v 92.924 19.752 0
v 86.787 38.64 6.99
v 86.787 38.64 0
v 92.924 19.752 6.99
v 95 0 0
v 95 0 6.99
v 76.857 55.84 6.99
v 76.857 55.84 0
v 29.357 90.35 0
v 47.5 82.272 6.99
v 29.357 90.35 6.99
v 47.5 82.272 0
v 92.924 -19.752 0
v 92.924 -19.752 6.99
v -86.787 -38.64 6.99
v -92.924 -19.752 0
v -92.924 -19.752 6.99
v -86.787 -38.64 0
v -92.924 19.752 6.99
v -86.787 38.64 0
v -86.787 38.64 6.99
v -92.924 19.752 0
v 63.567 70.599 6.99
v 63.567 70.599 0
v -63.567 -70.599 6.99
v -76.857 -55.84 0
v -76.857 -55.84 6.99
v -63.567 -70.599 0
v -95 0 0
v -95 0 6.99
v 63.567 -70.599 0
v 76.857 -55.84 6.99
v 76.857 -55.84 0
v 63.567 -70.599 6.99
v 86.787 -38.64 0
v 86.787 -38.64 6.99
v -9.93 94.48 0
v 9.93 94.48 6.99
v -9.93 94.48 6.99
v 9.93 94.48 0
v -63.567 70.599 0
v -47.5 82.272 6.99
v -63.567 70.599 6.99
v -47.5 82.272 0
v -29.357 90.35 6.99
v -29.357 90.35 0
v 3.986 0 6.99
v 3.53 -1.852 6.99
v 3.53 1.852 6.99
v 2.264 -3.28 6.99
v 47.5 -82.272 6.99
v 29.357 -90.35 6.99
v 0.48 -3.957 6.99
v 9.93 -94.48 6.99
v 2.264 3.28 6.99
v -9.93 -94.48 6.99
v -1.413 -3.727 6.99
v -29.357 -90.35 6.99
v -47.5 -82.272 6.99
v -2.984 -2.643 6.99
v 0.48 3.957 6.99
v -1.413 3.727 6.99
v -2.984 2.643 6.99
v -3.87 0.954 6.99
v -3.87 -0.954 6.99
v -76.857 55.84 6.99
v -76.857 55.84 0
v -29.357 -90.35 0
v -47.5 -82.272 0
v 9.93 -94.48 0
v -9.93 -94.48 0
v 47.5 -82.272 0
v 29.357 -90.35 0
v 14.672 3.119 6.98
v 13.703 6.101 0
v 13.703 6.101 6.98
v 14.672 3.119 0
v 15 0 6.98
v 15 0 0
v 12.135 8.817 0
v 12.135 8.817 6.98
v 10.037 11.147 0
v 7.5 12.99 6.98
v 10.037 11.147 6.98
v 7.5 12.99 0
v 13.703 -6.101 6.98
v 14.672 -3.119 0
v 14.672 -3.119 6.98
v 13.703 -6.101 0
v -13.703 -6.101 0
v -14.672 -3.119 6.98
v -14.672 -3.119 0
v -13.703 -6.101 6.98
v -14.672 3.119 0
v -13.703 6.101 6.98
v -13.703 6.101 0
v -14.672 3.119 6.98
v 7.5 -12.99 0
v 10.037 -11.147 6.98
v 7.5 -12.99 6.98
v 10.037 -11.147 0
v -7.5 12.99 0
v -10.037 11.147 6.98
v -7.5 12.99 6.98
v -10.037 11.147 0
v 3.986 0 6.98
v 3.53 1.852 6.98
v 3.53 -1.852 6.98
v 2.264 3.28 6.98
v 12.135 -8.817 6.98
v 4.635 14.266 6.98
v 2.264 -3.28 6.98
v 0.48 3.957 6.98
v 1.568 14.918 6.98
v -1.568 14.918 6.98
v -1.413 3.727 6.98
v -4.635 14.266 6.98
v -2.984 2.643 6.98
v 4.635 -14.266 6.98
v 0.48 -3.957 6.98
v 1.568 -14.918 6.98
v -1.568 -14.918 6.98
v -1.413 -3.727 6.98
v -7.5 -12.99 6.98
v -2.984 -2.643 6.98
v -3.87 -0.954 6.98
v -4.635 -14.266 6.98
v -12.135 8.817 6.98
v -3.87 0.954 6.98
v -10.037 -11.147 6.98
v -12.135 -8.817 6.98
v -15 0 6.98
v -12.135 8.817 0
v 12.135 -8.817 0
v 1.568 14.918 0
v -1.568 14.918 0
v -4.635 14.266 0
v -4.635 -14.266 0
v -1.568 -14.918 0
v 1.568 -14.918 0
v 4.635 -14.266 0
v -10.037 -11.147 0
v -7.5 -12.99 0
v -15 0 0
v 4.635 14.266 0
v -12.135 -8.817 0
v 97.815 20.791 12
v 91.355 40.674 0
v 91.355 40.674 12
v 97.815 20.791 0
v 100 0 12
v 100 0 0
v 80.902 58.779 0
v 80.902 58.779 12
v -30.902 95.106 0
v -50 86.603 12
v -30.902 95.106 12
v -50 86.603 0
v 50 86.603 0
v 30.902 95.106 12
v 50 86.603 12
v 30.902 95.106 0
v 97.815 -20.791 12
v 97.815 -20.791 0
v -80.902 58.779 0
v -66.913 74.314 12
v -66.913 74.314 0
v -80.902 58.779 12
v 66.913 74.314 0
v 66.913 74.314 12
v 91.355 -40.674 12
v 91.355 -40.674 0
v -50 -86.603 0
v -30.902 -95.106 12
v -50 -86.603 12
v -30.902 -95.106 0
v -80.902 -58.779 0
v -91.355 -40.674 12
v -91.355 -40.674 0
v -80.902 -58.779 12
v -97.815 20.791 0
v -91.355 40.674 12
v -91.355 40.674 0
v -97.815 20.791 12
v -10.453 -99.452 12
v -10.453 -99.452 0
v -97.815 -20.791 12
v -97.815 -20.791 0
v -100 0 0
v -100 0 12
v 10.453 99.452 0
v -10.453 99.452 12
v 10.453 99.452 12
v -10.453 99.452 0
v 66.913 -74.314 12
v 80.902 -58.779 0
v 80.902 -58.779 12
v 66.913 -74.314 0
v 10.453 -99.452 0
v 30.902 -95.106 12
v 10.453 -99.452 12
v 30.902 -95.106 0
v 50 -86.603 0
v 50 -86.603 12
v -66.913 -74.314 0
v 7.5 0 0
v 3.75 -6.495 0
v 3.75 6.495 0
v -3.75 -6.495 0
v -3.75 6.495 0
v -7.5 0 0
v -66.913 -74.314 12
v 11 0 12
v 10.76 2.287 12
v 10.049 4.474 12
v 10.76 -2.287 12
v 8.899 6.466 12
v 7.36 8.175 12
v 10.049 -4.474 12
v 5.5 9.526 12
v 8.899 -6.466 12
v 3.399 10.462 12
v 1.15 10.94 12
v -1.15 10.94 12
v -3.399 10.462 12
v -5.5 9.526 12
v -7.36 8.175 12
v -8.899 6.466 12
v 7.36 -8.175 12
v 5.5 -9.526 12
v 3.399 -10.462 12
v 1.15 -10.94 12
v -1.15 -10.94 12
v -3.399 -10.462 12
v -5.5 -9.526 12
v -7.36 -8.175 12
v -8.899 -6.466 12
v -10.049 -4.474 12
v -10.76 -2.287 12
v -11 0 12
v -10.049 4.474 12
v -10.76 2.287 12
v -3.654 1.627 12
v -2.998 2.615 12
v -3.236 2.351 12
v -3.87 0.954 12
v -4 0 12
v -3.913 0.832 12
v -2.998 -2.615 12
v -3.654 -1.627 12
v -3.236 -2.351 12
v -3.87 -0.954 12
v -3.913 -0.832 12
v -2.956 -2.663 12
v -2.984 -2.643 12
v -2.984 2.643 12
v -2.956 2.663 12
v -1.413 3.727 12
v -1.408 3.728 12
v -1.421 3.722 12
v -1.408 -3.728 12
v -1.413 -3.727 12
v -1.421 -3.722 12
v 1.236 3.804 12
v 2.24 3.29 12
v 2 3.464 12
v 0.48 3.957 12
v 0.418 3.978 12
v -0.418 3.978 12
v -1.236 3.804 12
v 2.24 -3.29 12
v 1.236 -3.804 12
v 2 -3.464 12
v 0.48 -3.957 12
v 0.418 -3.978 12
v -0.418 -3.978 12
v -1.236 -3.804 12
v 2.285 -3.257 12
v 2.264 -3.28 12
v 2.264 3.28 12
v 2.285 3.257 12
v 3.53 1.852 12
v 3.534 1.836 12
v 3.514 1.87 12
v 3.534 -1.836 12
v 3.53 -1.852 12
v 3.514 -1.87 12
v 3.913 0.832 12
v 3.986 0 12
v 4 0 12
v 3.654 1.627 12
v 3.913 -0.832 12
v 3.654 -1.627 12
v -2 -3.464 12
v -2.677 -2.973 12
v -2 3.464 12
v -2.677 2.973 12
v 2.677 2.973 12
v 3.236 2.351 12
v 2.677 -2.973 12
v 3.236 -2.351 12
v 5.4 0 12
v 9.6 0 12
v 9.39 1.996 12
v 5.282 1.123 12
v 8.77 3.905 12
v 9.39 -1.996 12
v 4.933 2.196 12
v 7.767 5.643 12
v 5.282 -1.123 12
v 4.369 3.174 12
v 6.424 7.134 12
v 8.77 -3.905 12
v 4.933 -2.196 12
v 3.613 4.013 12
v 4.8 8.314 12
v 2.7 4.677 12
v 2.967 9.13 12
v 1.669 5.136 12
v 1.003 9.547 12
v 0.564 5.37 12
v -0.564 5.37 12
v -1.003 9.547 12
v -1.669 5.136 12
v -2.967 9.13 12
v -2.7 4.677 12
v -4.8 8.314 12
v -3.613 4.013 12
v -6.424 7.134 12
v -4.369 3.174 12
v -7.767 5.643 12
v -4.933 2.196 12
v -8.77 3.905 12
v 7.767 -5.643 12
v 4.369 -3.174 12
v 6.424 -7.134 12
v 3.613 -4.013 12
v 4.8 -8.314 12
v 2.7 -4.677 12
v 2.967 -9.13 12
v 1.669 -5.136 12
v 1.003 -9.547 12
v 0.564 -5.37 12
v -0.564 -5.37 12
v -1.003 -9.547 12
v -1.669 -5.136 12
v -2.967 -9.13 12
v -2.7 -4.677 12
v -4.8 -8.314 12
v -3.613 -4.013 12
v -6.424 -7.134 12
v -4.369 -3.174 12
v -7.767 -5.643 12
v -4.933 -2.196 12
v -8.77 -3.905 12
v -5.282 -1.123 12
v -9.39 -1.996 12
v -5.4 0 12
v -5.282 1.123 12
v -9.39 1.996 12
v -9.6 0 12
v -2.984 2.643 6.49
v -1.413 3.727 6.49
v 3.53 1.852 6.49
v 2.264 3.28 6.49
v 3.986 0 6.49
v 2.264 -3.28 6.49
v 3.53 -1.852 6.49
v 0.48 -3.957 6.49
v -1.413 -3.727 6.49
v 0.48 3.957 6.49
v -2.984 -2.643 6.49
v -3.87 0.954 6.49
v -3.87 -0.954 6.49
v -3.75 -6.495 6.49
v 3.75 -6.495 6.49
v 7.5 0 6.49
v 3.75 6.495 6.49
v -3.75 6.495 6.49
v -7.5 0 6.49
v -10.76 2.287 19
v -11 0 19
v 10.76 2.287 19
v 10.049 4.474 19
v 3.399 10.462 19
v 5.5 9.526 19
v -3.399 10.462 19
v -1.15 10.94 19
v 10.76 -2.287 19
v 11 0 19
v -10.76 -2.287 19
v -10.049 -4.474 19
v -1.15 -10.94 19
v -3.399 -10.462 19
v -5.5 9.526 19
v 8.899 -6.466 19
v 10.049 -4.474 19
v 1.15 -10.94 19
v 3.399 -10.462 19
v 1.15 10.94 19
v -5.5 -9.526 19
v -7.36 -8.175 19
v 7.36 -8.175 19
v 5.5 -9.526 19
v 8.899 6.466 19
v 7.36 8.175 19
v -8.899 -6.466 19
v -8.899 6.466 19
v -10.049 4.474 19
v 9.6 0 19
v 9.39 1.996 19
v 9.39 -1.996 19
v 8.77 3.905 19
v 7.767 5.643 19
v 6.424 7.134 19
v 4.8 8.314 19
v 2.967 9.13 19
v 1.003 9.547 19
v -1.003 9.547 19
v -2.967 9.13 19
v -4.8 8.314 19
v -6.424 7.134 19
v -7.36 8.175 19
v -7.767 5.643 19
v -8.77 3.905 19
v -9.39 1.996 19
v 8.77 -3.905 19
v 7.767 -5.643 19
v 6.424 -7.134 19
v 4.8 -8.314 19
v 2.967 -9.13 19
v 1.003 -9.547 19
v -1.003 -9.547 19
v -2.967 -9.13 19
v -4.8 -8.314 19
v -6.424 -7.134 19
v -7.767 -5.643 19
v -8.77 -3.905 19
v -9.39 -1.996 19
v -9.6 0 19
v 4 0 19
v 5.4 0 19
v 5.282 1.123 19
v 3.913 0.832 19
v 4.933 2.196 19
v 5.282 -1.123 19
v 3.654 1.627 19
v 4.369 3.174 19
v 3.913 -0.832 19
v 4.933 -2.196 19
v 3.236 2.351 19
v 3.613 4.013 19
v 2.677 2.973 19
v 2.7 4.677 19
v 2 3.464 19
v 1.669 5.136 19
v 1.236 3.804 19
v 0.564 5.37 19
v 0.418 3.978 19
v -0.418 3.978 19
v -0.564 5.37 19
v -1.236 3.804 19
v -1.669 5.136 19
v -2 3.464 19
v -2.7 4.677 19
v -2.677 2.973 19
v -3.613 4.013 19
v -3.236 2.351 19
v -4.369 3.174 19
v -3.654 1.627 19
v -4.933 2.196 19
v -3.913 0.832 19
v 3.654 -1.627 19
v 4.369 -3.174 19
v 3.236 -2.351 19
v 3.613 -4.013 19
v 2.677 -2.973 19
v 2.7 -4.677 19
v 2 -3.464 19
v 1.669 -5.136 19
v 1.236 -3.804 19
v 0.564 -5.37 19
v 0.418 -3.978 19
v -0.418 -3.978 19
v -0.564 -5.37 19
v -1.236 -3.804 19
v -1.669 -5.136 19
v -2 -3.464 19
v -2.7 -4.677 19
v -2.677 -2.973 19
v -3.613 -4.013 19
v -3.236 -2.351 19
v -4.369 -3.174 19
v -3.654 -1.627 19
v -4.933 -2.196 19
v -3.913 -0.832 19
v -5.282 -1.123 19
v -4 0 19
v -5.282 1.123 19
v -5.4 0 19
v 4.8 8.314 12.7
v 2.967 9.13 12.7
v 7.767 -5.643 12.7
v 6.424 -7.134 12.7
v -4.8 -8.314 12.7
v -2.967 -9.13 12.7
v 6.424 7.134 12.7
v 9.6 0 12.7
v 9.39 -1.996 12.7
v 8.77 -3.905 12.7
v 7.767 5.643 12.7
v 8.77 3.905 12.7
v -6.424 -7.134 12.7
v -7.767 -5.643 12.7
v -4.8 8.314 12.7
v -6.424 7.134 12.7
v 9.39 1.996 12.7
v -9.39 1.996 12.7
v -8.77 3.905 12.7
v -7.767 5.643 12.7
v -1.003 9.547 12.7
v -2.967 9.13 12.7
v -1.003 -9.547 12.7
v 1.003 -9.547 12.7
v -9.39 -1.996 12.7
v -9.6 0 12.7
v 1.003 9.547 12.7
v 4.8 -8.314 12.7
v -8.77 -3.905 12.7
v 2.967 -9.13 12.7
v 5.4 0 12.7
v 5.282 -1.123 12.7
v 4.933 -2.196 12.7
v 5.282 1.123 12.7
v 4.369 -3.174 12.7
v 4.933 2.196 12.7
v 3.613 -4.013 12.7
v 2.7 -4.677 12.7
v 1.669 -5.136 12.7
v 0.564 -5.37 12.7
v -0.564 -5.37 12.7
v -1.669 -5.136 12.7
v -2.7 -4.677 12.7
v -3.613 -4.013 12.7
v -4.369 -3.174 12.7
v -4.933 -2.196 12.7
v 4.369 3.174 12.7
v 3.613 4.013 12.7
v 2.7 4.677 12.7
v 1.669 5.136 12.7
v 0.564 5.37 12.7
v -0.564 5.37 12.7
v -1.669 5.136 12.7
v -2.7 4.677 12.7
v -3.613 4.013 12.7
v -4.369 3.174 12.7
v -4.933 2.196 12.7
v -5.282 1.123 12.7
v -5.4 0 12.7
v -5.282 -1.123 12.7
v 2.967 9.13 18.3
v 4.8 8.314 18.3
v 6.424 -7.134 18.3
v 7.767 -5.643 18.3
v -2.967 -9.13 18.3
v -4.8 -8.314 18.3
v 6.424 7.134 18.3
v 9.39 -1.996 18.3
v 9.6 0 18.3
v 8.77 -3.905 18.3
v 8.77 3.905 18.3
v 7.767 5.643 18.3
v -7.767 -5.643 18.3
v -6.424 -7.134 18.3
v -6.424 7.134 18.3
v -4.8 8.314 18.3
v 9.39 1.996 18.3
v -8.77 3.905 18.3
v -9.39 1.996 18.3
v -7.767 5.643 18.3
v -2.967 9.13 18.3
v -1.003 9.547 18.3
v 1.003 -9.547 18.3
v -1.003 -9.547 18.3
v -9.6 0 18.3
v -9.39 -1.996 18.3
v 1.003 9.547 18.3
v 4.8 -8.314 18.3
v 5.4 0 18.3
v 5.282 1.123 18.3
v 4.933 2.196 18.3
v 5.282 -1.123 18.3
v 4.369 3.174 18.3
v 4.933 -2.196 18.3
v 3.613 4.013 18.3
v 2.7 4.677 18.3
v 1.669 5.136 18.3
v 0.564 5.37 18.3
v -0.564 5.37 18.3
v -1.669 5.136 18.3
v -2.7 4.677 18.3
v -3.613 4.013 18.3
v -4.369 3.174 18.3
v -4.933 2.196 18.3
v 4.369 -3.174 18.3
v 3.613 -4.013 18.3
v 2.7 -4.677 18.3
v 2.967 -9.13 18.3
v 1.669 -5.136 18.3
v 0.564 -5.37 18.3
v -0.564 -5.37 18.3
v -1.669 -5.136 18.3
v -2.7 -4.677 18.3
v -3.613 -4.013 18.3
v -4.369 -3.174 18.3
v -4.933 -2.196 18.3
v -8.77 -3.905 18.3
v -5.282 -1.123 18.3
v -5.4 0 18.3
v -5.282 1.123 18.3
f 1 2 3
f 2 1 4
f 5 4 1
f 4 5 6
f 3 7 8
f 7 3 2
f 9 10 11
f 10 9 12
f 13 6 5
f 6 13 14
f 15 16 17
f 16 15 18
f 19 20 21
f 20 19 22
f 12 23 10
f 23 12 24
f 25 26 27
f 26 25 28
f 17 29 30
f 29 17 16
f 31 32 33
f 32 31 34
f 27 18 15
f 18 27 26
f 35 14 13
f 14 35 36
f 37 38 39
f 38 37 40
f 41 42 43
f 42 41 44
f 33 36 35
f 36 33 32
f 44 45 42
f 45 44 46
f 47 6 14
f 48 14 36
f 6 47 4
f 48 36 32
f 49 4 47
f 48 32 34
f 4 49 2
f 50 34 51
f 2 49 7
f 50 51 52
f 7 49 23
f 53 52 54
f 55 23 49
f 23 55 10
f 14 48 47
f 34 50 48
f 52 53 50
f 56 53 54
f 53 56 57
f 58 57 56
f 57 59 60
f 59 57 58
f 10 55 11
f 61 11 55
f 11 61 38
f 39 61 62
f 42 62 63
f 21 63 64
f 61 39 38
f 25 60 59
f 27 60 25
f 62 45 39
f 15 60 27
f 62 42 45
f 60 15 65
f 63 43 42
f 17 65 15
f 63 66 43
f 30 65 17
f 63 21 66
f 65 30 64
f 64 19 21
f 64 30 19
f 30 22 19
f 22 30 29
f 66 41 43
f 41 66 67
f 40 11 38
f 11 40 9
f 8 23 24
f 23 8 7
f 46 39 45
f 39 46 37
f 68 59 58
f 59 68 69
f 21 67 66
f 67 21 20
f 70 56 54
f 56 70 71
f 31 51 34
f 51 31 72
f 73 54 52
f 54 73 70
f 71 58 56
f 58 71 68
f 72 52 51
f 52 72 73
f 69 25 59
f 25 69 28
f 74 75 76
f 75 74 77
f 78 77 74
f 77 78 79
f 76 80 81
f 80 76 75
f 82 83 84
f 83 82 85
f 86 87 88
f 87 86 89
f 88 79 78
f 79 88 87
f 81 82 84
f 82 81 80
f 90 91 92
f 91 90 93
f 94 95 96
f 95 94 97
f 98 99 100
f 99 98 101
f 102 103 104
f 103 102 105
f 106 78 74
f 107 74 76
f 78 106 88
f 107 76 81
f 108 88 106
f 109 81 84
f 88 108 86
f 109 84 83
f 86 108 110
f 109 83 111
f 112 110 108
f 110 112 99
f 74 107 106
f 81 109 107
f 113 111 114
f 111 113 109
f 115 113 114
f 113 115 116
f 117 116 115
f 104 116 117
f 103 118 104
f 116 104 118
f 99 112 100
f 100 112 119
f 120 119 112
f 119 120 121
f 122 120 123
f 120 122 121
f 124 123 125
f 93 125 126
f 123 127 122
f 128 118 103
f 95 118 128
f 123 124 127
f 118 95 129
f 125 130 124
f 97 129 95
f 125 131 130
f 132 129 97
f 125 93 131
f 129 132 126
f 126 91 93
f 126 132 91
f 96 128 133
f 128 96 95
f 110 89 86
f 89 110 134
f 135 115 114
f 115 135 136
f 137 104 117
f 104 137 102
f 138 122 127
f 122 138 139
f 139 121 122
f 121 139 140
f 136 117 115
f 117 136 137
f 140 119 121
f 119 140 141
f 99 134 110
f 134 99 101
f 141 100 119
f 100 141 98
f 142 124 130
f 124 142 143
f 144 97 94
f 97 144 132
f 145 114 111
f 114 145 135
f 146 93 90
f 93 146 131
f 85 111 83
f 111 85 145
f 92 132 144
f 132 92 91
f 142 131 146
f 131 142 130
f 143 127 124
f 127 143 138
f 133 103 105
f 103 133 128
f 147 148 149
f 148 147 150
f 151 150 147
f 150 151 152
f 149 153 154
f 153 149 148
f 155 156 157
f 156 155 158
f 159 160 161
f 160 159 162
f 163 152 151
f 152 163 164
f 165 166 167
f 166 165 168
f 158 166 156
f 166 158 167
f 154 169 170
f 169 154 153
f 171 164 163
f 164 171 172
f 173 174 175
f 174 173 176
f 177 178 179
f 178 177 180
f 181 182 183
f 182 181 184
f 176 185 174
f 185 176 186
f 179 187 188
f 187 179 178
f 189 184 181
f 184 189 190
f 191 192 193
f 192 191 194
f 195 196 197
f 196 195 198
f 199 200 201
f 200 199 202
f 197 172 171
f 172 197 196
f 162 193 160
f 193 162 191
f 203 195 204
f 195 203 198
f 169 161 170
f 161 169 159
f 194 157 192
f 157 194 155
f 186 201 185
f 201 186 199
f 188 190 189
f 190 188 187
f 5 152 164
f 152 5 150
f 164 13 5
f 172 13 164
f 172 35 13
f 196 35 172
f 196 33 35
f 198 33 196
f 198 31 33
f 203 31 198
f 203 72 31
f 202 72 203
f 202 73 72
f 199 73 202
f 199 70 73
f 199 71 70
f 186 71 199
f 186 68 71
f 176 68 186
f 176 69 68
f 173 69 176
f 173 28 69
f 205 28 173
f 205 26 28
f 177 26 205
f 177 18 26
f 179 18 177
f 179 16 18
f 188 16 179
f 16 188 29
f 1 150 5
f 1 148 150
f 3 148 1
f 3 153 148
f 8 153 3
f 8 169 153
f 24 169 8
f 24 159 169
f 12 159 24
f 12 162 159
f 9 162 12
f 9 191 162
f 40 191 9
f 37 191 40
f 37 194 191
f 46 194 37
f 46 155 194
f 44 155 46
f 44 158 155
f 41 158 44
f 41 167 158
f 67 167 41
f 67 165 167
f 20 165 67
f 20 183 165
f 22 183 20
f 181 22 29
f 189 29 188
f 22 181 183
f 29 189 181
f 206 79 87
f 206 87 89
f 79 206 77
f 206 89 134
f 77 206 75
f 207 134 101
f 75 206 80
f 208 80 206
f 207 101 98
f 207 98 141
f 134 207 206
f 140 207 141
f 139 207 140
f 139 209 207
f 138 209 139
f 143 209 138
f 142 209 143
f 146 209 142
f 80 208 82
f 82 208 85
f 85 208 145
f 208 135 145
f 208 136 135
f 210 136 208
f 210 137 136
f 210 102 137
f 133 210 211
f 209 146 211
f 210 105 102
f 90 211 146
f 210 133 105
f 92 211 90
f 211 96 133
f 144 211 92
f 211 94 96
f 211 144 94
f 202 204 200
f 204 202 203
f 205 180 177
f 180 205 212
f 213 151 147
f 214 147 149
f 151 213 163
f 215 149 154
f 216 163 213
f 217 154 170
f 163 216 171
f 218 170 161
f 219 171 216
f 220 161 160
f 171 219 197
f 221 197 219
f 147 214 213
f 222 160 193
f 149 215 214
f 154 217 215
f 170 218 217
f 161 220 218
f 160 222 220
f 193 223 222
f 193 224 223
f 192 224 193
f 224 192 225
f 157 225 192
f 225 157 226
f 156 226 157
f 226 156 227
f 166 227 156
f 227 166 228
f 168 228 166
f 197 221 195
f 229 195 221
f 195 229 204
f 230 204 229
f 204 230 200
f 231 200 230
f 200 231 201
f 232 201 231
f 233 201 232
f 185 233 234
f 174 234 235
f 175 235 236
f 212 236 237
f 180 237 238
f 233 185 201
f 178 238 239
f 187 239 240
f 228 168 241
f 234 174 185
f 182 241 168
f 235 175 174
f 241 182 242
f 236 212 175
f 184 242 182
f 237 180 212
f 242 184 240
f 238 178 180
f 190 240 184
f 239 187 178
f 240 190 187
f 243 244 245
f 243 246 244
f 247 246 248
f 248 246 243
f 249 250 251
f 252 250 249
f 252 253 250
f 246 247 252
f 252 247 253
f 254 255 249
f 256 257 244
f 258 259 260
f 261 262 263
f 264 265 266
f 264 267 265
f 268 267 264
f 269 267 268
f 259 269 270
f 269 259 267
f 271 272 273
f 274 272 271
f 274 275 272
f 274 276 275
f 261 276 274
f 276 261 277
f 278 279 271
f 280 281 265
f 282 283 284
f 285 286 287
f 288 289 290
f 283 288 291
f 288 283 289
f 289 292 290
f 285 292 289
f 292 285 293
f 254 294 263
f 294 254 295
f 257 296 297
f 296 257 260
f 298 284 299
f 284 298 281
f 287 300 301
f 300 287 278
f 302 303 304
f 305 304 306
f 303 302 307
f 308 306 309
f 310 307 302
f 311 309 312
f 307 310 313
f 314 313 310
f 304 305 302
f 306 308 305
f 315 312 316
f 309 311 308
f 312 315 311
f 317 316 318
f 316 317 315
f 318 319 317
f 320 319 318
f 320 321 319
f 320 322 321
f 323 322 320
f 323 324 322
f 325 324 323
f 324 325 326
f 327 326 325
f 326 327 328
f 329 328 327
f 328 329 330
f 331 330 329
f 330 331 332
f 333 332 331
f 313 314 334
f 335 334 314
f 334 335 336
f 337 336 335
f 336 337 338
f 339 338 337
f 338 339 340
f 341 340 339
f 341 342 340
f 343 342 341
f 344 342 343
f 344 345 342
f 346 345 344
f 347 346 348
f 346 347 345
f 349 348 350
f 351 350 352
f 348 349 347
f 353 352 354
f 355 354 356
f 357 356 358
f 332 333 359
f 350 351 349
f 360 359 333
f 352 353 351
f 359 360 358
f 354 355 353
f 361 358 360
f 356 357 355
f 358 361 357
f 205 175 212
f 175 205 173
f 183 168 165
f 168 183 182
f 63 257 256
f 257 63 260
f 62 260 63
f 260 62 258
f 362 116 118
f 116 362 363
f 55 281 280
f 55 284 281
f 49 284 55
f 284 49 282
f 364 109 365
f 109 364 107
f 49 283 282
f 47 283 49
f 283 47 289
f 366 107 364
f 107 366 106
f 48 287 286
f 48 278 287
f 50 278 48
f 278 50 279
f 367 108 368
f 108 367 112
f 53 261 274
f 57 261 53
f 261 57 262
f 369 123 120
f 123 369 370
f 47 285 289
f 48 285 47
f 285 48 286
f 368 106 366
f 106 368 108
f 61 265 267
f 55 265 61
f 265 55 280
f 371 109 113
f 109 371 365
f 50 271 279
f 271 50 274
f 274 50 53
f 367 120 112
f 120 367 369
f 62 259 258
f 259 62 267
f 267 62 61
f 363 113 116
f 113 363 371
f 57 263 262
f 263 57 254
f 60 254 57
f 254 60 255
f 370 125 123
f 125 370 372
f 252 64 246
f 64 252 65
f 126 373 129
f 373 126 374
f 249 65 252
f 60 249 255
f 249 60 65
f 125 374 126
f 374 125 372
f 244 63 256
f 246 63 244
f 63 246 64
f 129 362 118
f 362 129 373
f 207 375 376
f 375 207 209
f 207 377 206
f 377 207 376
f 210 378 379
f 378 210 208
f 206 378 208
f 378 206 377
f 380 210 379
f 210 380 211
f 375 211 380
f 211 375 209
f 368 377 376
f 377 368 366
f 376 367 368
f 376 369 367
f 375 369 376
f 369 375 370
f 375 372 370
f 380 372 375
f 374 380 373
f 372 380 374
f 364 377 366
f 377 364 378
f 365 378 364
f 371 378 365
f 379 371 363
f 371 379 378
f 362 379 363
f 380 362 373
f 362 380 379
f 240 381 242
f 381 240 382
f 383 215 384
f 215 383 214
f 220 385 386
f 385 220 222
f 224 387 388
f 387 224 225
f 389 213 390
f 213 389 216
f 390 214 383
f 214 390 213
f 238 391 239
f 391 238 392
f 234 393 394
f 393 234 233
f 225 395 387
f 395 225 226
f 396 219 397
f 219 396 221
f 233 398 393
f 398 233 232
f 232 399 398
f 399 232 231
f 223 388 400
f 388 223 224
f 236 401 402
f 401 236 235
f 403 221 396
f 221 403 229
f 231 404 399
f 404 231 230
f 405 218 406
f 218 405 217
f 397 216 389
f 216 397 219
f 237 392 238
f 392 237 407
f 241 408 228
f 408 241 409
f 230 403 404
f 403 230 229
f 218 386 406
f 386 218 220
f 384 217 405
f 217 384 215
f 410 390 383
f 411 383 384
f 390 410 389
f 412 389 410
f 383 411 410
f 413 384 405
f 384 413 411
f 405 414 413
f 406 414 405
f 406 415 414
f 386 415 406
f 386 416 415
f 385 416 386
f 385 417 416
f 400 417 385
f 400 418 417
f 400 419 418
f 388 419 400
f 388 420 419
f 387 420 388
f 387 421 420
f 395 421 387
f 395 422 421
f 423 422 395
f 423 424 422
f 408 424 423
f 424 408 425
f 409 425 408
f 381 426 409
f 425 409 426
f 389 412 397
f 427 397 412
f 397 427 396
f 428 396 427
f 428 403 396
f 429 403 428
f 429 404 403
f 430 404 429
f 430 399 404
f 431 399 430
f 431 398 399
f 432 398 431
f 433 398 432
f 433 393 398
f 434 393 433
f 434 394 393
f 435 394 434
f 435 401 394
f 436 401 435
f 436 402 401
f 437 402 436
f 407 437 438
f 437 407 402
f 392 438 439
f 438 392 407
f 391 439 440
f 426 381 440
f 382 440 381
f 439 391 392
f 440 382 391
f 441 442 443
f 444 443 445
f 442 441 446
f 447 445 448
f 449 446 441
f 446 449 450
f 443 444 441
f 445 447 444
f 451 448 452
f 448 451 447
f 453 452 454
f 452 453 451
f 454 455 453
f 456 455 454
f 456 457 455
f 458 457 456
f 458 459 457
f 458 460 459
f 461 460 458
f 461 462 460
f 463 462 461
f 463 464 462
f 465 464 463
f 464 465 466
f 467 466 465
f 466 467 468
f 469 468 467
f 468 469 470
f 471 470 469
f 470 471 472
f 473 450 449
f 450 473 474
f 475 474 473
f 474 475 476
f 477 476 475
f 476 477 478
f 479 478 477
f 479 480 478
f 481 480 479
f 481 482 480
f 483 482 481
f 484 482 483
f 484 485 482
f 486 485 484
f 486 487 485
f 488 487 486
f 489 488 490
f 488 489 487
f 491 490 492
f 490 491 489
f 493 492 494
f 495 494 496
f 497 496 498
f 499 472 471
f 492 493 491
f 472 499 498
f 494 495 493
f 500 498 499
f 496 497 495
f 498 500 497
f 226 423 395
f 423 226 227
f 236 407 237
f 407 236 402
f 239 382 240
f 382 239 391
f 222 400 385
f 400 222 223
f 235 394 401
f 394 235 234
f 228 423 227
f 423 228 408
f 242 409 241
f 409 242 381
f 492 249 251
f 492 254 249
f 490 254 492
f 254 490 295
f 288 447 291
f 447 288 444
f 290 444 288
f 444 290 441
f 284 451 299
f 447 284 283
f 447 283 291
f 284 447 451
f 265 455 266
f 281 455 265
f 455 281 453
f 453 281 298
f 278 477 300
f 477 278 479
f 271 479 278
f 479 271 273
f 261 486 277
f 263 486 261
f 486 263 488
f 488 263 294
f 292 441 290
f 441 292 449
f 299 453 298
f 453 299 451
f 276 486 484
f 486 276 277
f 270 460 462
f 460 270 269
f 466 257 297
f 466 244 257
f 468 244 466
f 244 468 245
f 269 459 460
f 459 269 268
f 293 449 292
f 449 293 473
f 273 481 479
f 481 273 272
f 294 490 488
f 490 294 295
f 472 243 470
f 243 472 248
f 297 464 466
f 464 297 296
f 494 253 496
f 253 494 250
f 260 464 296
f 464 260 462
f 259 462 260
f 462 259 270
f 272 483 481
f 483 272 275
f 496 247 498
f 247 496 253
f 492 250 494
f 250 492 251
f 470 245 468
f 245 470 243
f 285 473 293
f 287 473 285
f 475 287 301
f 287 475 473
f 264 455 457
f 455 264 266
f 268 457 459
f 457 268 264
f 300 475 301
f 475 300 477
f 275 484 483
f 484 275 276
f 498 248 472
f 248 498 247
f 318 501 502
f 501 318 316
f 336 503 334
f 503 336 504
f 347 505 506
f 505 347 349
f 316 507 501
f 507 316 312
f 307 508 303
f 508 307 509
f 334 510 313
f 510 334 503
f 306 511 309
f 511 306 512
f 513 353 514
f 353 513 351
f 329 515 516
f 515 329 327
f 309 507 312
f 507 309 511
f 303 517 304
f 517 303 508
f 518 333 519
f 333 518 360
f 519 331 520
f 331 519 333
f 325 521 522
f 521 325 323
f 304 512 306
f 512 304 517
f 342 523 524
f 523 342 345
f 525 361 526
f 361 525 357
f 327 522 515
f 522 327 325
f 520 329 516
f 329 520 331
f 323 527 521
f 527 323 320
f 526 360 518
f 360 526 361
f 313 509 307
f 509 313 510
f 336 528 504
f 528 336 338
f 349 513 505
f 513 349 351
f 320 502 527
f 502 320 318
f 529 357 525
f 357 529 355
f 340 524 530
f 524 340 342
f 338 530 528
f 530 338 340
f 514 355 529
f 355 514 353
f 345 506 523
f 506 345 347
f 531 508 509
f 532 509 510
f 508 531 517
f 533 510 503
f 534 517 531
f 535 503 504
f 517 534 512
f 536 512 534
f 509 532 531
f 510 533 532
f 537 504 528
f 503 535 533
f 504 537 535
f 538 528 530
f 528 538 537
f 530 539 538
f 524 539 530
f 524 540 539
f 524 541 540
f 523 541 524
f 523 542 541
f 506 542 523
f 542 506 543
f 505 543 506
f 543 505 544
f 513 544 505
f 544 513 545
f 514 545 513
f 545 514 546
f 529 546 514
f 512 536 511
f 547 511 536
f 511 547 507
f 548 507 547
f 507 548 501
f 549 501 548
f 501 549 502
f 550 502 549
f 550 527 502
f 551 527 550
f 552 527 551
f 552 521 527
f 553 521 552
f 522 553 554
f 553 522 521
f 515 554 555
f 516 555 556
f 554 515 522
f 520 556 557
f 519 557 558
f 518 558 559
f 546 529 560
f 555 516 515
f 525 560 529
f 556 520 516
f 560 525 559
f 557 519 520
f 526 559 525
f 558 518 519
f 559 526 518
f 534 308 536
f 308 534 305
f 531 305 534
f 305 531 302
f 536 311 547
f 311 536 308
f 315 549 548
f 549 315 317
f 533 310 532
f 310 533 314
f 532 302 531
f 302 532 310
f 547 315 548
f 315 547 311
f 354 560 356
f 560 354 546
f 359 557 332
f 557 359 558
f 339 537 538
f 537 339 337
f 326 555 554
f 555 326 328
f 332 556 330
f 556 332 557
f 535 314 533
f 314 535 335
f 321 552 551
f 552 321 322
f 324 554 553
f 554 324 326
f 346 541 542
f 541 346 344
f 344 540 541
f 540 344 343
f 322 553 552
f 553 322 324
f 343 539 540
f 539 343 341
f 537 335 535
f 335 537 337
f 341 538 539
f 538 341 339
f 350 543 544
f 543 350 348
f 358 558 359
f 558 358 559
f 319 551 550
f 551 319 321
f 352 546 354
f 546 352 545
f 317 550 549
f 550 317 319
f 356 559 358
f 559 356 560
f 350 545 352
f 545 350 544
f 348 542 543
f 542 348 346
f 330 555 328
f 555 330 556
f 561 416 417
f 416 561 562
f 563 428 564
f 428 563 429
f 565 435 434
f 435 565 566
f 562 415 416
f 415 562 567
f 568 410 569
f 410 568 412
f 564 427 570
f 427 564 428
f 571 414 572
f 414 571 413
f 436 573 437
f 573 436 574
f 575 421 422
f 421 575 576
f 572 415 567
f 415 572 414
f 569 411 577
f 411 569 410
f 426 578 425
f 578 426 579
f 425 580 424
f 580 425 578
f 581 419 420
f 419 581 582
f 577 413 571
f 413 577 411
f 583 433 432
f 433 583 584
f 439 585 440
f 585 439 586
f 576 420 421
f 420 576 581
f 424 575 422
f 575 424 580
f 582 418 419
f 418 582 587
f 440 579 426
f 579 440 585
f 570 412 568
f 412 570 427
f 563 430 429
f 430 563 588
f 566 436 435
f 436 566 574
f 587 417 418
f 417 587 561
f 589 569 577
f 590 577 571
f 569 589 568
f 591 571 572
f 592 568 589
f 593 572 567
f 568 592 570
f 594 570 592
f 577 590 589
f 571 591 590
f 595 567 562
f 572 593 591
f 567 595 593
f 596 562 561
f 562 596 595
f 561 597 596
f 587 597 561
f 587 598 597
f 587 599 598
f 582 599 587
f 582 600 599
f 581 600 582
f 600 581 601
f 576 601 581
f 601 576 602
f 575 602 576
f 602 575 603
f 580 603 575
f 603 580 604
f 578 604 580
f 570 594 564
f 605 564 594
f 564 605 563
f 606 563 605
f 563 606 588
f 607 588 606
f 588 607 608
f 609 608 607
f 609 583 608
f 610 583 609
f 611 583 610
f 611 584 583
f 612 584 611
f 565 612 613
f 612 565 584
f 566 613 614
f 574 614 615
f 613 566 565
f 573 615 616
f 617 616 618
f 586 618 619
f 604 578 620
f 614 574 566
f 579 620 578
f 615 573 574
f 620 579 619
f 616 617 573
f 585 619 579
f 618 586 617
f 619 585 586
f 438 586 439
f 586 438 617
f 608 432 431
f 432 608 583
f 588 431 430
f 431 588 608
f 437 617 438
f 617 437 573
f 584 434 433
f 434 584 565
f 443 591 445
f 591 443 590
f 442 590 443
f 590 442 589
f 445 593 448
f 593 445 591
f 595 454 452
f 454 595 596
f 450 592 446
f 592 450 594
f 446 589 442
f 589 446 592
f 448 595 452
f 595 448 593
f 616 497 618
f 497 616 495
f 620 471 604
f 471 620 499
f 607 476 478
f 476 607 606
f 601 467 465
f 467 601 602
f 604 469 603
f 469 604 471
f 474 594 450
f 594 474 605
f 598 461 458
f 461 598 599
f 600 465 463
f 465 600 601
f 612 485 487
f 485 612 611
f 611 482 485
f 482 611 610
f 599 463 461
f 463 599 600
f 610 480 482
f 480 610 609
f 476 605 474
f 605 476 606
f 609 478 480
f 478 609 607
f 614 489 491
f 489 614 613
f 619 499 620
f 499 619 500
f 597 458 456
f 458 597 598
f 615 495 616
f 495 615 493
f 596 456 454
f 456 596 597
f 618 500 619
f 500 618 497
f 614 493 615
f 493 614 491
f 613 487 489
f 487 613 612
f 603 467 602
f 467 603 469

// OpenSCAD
include <MCAD/stepper.scad>
include <MCAD/units.scad>
include <MCAD/materials.scad>
include <MCAD/bearing.scad>

include <MCAD/nuts_and_bolts.scad>

//motor(Nema17);


color(Iron) {
	//translate([15*cm,0,0]) nutHole(8);
}

difference(){
	// Base
	difference() {
		cylinder(h=12*mm, r=10*cm);
		
		translate([0,0,-epsilon	]) difference() {
			cylinder(h=7*mm, r=9.5*cm);
			translate([0,0,-epsilon	]) cylinder(h=7*mm, r=1.5*cm);
		}
	}

	// Nut hole
	translate([0,0,-epsilon	]) nutHole(8);

	// Center hole
	translate([0,0,-1.5]) boltHole(8, length=15*mm);
	
}
bearing(pos=[0, 0, 12*mm], model=SkateBearing);
